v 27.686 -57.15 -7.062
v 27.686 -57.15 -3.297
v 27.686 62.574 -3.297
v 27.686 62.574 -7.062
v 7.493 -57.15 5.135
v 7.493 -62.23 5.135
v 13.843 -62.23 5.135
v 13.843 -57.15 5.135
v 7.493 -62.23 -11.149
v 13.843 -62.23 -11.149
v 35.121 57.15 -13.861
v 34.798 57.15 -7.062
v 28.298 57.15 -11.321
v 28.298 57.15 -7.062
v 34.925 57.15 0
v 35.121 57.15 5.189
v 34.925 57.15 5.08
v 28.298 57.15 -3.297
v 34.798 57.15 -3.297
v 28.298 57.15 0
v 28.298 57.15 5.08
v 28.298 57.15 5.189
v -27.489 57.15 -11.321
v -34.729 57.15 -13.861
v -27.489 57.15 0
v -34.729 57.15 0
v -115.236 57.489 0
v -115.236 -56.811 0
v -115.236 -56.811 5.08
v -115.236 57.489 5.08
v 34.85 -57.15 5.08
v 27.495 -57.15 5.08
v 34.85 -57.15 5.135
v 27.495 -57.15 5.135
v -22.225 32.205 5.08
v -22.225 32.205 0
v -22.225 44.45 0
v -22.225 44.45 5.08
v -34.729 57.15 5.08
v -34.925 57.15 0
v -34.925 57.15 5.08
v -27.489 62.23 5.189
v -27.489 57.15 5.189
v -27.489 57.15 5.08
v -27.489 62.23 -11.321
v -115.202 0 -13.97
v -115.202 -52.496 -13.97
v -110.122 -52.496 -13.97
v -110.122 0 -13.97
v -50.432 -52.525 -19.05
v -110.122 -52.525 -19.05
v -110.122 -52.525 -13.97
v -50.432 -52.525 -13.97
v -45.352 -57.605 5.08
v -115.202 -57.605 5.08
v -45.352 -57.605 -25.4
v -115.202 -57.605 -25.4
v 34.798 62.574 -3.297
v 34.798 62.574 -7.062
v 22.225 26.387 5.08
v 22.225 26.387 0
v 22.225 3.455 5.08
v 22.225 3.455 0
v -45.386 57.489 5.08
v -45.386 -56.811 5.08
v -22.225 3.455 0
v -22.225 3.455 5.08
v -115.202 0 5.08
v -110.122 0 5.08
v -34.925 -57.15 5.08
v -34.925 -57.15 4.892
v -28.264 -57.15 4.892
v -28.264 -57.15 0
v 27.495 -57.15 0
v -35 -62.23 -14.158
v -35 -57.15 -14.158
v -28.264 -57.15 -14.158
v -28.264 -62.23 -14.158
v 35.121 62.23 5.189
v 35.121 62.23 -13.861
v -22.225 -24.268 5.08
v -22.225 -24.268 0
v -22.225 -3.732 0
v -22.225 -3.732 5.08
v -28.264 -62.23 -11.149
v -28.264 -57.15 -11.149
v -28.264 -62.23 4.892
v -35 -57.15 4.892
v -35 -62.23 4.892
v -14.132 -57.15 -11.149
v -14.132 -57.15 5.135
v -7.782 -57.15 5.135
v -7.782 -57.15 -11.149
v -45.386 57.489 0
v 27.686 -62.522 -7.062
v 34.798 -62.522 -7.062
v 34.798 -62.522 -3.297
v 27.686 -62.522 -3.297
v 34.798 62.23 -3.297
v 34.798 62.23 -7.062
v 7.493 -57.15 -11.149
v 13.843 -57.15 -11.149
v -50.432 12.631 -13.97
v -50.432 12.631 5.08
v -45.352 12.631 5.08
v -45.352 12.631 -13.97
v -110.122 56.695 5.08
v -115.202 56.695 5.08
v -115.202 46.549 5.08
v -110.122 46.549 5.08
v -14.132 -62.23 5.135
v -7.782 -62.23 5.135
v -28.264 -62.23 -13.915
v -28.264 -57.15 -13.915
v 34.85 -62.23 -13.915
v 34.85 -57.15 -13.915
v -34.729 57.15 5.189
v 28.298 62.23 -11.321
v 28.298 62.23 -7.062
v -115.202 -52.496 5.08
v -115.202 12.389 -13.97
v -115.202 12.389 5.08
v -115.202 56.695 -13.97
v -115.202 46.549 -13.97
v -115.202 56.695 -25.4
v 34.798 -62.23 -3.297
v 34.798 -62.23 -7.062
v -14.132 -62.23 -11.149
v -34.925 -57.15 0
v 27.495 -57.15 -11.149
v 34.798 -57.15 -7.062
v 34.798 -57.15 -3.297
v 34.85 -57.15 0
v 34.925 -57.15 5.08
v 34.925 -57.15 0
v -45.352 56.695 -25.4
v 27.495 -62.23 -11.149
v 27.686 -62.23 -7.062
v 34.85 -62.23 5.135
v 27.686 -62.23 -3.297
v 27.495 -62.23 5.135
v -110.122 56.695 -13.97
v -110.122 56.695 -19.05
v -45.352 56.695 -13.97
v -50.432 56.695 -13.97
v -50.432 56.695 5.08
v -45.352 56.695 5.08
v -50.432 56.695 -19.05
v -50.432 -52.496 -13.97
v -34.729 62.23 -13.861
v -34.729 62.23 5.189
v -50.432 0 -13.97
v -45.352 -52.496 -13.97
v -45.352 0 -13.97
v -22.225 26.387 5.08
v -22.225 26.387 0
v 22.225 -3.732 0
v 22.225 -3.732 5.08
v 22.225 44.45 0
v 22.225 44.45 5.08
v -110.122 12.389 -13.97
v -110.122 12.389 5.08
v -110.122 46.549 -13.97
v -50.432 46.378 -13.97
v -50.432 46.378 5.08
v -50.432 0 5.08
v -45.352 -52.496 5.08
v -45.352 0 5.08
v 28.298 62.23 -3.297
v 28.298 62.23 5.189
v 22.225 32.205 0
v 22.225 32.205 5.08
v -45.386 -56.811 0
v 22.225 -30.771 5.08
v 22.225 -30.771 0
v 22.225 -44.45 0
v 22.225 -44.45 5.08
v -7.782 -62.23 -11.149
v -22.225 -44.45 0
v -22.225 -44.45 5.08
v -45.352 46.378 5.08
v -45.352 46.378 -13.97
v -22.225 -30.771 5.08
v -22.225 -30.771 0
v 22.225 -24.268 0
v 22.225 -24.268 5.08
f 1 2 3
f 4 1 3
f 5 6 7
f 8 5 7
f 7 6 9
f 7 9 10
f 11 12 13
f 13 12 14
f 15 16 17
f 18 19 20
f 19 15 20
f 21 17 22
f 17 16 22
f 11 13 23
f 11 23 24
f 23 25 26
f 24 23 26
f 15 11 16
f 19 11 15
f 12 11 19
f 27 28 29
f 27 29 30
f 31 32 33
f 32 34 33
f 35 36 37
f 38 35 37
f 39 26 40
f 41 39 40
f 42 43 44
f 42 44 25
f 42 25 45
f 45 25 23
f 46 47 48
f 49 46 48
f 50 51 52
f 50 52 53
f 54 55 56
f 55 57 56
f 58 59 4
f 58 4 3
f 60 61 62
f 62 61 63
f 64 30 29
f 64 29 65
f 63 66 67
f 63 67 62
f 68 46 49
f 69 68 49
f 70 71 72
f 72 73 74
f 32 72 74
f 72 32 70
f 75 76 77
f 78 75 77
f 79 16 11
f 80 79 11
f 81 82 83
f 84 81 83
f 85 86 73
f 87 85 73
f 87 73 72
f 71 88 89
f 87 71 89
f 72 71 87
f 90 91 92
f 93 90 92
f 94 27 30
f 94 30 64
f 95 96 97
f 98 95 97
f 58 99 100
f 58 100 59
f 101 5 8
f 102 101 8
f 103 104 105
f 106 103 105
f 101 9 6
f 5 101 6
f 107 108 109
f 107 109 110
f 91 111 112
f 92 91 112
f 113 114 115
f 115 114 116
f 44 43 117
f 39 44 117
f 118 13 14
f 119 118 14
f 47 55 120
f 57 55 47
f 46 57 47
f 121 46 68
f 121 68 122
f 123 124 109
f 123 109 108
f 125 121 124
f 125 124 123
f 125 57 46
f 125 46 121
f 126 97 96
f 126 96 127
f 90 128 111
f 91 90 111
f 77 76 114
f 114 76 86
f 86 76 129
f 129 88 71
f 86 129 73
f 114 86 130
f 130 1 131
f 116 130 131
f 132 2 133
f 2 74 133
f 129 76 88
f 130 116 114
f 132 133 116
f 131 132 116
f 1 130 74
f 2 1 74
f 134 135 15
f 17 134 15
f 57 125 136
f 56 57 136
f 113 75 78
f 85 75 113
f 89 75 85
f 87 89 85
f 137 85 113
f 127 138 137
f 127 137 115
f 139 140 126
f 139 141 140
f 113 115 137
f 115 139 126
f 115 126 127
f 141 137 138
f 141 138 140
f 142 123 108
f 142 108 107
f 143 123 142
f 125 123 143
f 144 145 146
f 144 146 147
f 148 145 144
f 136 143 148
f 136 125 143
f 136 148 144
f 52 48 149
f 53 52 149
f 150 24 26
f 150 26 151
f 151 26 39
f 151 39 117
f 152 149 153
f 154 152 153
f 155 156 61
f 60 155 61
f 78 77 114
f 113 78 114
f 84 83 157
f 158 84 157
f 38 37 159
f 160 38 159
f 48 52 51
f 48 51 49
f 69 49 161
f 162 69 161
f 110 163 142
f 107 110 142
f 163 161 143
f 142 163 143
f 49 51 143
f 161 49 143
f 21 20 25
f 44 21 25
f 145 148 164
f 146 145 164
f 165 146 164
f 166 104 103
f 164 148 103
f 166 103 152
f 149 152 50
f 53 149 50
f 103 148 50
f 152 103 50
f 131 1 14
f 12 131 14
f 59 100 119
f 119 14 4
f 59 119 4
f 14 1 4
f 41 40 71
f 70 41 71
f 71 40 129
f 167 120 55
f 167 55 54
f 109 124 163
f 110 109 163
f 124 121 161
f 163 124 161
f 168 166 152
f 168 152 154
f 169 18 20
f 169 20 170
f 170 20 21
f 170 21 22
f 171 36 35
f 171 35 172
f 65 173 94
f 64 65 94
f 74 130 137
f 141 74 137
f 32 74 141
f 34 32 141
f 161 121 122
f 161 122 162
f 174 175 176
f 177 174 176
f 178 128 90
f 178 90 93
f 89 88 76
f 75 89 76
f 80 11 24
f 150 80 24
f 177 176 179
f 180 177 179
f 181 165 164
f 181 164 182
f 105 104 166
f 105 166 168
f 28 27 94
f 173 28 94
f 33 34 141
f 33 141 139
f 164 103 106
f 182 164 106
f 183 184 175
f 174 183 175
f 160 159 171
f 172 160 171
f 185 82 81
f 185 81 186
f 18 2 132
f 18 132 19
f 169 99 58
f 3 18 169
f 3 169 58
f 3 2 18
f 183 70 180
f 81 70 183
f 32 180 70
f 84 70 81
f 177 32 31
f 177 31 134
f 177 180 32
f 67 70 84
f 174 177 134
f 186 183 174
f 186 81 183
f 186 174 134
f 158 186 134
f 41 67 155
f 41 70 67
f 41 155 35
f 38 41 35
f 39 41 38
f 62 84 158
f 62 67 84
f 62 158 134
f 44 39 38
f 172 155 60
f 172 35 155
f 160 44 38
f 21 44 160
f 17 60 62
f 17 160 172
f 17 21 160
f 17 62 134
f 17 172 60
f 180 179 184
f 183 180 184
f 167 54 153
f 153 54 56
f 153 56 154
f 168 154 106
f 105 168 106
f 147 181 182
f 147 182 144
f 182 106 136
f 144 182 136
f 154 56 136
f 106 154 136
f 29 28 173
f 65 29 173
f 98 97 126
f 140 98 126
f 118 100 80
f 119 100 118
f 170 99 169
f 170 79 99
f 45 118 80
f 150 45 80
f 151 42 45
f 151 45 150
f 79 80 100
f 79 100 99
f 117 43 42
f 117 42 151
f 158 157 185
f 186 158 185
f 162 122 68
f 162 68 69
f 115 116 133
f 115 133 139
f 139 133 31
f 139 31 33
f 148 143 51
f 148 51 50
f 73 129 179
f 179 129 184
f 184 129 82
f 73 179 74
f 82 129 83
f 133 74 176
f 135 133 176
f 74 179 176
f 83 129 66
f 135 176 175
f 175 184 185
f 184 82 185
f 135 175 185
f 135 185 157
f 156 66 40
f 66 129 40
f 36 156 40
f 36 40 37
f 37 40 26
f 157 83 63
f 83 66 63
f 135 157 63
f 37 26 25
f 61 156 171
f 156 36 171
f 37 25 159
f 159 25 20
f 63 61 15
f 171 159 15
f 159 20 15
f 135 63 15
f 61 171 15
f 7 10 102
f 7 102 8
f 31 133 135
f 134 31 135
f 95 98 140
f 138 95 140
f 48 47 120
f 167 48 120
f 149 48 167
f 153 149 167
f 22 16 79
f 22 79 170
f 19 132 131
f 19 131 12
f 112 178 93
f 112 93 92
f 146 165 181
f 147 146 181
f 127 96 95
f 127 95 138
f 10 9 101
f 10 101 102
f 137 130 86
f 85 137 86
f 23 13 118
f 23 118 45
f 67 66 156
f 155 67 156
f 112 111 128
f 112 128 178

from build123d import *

# Parameters (mm, degrees)
F0_W      = 69.85
F0_H      = 114.3
F1_DEPTH  = 5.08
F3_W      = 69.85
F3_H      = 114.3
F4_DEPTH  = 6.35
F7_W      = 12.7
F7_H      = 12.7
F7_W_2    = 44.45
F7_H_2    = 5.8184303343
F7_H_3    = 7.1874738205
F7_H_4    = 6.5029524267
F8_DEPTH  = 5.08
F9_W      = 6.7361761562
F9_H      = 16.0402691672
F9_H_2    = 2.7664669489
F9_W_2    = 55.7594845613
F9_H_3    = 0.2432638838
F9_W_3    = 7.3543392825
F9_H_4    = 16.2835330511
F10_DEPTH = 5.08
F11_W     = 7.239518579
F11_H     = 16.51
F11_H_2   = 2.54
F11_W_2   = 55.786697957
F11_W_3   = 6.823783464
F12_DEPTH = 5.08
F13_W     = 5.08
F13_H     = 5.08
F13_H_2   = 104.14
F13_W_2   = 59.69
F14_DEPTH = 5.08
F15_W     = 69.85
F15_H     = 5.1094701806
F15_W_2   = 5.08
F15_H_2   = 12.3887229711
F15_H_3   = 12.630738318
F15_H_4   = 10.1458194217
F15_H_5   = 10.3169480821
F16_DEPTH = 19.05
F18_W     = 125.0962689519
F18_H     = 3.7648670841
F19_DEPTH = 7.112
F20_W     = 6.35
F20_H     = 16.2835330511
F21_DEPTH = 5.08


with BuildPart() as f1:
    # F0 (on Top) → F1 (new body)
    with BuildSketch(Plane.XY):
        with Locations((-80.3107898682, 0.339157423)):
            Rectangle(F0_W, F0_H)
    extrude(amount=F1_DEPTH)


with BuildPart() as f4:
    # F3 (on offset) → F4 (new body)
    with BuildSketch(Plane.XY.offset(-25.4)):
        with Locations((-80.2773684263, -0.4551621059)):
            Rectangle(F3_W, F3_H)
    extrude(amount=F4_DEPTH)

    # F13 (on face) → F14 (join)
    with BuildSketch(Plane.XY.offset(-19.05)):
        with Locations((-112.6623684263, 54.1548378941)):
            Rectangle(F13_W, F13_H)
        with Locations((-112.6623684263, -55.0651621059)):
            Rectangle(F13_W, F13_H)
        with Locations((-47.8923684263, 54.1548378941)):
            Rectangle(F13_W, F13_H)
        with Locations((-47.8923684263, -55.0651621059)):
            Rectangle(F13_W, F13_H)
        with Locations((-112.6623684263, -0.4551621059)):
            Rectangle(F13_W, F13_H_2)
        with Locations((-47.8923684263, -0.4551621059)):
            Rectangle(F13_W, F13_H_2)
        with Locations((-80.2773684263, -55.0651621059)):
            Rectangle(F13_W_2, F13_H)
    extrude(amount=F14_DEPTH)

    # F15 (on face) → F16 (join)
    with BuildSketch(Plane.XY.offset(-13.97)):
        with Locations((-80.2773684263, -55.0504270156)):
            Rectangle(F15_W, F15_H)
        with Locations((-112.6623684263, 6.1943614855)):
            Rectangle(F15_W_2, F15_H_2)
        with Locations((-47.8923684263, 6.315369159)):
            Rectangle(F15_W_2, F15_H_3)
        with Locations((-112.6623684263, 51.6219281833)):
            Rectangle(F15_W_2, F15_H_4)
        with Locations((-47.8923684263, 51.536363853)):
            Rectangle(F15_W_2, F15_H_5)
    extrude(amount=F16_DEPTH)


with BuildPart() as f8:
    # F7 (on Top) → F8 (new body)
    with BuildSketch(Plane.XY):
        with Locations((28.575, -50.8)):
            Rectangle(F7_W, F7_H)
        with Locations((0, -50.8)):
            Rectangle(F7_W_2, F7_H)
        Polygon((22.225, -44.45), (34.925, -44.45), (34.925, 44.45), (22.225, 44.45), (22.225, 32.2049371898), (22.225, 26.3865068555), (22.225, 3.4550426062), (22.225, -3.7324312143), (22.225, -24.2680702358), (22.225, -30.7710226625), align=None)
        with Locations((-28.575, -50.8)):
            Rectangle(F7_W, F7_H)
        with Locations((28.575, 50.8)):
            Rectangle(F7_W, F7_H)
        Polygon((-34.925, -44.45), (-22.225, -44.45), (-22.225, -30.7710226625), (-22.225, -24.2680702358), (-22.225, -3.7324312143), (-22.225, 3.4550426062), (-22.225, 26.3865068555), (-22.225, 32.2049371898), (-22.225, 44.45), (-34.925, 44.45), align=None)
        with Locations((0, 50.8)):
            Rectangle(F7_W_2, F7_H)
        with Locations((-28.575, 50.8)):
            Rectangle(F7_W, F7_H)
        with Locations((0, 29.2957220227)):
            Rectangle(F7_W_2, F7_H_2)
        with Locations((0, -0.138694304)):
            Rectangle(F7_W_2, F7_H_3)
        with Locations((0, -27.5195464492)):
            Rectangle(F7_W_2, F7_H_4)
    extrude(amount=F8_DEPTH)

    # F9 (on offset) → F10 (join)
    with BuildSketch(Plane.XZ.offset(57.15)):
        with Locations((-31.632169116, -3.1286035073)):
            Rectangle(F9_W, F9_H)
        with Locations((-31.632169116, -12.5319715654)):
            Rectangle(F9_W, F9_H_2)
        with Locations((-0.3843387572, -12.5319715654)):
            Rectangle(F9_W_2, F9_H_2)
        with Locations((-31.632169116, -14.0368369818)):
            Rectangle(F9_W, F9_H_3)
        with Locations((31.1725731647, -12.5319715654)):
            Rectangle(F9_W_3, F9_H_2)
        with Locations((31.1725731647, -3.0069715654)):
            Rectangle(F9_W_3, F9_H_4)
    extrude(amount=F10_DEPTH)

    # F11 (on face) → F12 (join)
    with BuildSketch(Plane(origin=(0, 57.15, 0), x_dir=(-1, 0, 0), z_dir=(0, 1, 0))):
        with Locations((31.1089185799, -3.0657224204)):
            Rectangle(F11_W, F11_H)
        with Locations((31.1089185799, -12.5907224204)):
            Rectangle(F11_W, F11_H_2)
        with Locations((-0.404189688, -12.5907224204)):
            Rectangle(F11_W_2, F11_H_2)
        with Locations((-31.7094303986, -3.0657224204)):
            Rectangle(F11_W_3, F11_H)
        with Locations((-31.7094303986, -12.5907224204)):
            Rectangle(F11_W_3, F11_H_2)
    extrude(amount=F12_DEPTH)

    # F18 (on offset) → F19 (join)
    with BuildSketch(Plane.YZ.offset(27.686)):
        with Locations((0.026088208, -5.1796053303)):
            Rectangle(F18_W, F18_H)
    extrude(amount=F19_DEPTH)


with BuildPart() as f21:
    # F20 (on face) → F21 (new body)
    with BuildSketch(Plane.XZ.offset(62.23)):
        with Locations((-10.9570405189, -3.0069715654)):
            Rectangle(F20_W, F20_H)
    extrude(amount=-F21_DEPTH)


with BuildPart() as f21b:
    # F20 (on face) → F21, piece 2 (new body)
    with BuildSketch(Plane.XZ.offset(62.23)):
        with Locations((10.668, -3.0069715654)):
            Rectangle(F20_W, F20_H)
    extrude(amount=-F21_DEPTH)


solid = Compound([f1.part, f4.part, f8.part, f21.part, f21b.part])
